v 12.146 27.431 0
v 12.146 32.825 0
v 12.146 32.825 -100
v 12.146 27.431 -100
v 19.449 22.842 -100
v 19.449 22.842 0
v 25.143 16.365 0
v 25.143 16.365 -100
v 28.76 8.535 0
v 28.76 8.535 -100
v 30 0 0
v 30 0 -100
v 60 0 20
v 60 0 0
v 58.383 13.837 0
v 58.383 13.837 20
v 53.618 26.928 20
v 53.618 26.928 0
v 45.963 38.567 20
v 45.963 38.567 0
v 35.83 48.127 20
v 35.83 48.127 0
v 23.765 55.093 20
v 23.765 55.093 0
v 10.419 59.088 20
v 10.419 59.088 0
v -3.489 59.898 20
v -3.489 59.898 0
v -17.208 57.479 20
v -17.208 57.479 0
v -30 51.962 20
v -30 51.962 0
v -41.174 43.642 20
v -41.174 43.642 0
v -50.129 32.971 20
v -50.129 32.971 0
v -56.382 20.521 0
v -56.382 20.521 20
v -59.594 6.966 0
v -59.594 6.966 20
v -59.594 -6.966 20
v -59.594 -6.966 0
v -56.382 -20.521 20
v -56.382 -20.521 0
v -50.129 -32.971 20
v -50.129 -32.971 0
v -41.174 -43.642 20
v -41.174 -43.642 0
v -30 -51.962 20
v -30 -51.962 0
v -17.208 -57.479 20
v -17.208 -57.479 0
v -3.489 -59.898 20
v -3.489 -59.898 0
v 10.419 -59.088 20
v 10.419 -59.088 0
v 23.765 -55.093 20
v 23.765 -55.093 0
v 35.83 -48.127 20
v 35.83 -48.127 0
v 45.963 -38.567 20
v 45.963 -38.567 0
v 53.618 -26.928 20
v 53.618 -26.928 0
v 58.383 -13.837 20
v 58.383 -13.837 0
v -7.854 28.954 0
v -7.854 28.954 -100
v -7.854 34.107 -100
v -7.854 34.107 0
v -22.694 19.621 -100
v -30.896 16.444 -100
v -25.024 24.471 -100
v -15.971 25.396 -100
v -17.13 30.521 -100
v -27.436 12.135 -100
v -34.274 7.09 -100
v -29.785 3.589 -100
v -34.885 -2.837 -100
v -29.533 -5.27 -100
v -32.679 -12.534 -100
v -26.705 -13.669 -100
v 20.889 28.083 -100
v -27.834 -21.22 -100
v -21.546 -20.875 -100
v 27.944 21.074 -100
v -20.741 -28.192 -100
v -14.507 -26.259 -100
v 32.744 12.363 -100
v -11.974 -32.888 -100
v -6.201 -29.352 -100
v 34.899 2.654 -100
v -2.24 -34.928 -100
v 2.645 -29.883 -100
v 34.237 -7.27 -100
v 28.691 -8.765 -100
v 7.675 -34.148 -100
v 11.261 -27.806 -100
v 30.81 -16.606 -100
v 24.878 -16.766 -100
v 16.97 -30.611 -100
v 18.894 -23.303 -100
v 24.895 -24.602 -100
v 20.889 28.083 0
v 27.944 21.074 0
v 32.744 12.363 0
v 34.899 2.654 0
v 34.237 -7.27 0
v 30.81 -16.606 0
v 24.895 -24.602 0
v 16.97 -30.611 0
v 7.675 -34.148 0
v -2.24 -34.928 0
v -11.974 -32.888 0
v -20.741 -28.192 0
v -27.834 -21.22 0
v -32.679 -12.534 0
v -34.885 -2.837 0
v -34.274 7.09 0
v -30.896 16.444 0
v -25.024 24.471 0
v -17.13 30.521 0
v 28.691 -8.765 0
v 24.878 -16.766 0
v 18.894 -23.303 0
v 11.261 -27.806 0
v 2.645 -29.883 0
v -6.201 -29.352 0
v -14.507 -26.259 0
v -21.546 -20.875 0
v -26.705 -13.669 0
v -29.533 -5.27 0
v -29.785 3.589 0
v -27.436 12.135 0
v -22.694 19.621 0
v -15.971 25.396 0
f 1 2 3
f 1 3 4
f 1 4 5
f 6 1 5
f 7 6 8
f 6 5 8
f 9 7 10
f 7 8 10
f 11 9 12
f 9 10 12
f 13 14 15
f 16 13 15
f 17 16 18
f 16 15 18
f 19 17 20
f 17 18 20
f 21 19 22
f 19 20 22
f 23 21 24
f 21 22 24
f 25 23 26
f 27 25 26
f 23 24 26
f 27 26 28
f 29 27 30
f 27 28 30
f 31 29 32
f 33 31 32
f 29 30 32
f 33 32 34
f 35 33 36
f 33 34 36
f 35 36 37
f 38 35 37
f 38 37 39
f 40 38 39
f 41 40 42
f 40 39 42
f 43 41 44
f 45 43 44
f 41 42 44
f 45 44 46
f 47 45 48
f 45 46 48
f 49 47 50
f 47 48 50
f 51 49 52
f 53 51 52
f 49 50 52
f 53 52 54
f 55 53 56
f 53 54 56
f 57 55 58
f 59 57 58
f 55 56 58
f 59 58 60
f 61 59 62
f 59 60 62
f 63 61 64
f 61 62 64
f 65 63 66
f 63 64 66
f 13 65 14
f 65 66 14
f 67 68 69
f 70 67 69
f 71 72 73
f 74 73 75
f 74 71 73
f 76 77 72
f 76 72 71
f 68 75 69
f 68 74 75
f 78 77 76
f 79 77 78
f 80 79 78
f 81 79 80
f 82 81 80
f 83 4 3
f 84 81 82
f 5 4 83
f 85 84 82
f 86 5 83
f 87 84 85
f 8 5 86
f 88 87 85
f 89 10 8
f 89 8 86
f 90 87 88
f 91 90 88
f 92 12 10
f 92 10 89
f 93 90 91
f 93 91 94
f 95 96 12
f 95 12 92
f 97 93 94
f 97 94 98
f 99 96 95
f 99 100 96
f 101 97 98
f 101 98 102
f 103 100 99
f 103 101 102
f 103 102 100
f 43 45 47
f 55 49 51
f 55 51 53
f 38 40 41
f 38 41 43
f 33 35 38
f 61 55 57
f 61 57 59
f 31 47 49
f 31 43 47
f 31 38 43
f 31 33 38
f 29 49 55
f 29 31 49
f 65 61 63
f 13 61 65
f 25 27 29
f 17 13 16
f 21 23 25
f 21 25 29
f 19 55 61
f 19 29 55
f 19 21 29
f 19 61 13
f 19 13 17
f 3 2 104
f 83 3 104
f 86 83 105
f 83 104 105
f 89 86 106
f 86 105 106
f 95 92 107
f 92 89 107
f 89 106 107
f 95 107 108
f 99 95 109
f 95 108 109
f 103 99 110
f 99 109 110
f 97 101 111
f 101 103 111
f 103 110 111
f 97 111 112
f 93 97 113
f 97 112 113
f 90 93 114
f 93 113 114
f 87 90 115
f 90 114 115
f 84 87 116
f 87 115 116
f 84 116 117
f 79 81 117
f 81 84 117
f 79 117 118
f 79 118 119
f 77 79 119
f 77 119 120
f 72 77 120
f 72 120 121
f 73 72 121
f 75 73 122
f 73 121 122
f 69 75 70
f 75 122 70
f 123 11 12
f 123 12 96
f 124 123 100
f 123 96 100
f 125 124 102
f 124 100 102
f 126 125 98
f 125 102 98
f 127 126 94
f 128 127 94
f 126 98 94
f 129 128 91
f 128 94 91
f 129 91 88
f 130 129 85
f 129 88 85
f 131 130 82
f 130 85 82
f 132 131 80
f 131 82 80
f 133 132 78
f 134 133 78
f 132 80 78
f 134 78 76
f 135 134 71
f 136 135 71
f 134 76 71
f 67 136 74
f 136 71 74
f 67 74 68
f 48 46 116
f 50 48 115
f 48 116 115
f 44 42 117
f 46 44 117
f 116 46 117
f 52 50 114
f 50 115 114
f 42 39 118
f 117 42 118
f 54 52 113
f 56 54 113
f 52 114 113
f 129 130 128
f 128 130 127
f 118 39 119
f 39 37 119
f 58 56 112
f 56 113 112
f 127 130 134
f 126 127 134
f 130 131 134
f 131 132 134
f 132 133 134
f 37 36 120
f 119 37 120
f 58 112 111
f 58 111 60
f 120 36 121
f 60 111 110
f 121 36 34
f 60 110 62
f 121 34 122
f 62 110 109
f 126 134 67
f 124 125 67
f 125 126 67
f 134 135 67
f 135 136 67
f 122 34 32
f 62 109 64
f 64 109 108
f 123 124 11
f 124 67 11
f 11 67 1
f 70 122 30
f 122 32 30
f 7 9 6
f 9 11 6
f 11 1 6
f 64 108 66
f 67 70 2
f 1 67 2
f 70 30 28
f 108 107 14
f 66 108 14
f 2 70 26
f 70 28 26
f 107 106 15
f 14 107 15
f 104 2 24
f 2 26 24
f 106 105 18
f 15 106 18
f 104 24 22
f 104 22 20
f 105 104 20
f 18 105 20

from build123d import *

# Parameters (mm, degrees)
F0_R     = 60
F1_DEPTH = 20
F2_R     = 35
F3_DEPTH = 100
F5_DEPTH = 100


with BuildPart() as f1:
    # F0 (on Top) → F1 (new body)
    with BuildSketch(Plane.XY):
        Circle(F0_R)
    extrude(amount=F1_DEPTH)

    # F2 (on face) → F3 (join)
    with BuildSketch(Plane(origin=(0, 0, 0), x_dir=(1, 0, 0), z_dir=(0, 0, -1))):
        Circle(F2_R)
    extrude(amount=F3_DEPTH)

    # F4 (on face) → F5 (cut)
    with BuildSketch(Plane(origin=(0, 0, -100), x_dir=(1, 0, 0), z_dir=(0, 0, -1))):
        with BuildLine():
            Line((-7.8536700457, -25.464490056), (-7.8536700457, -28.953753933))
            ThreePointArc((-7.8536700457, -28.953753933), (2.2773518168, -29.913436257), (12.1463299543, -27.4311259091))
            Line((12.1463299543, -27.4311259091), (12.1463299543, -25.464490056))
            Line((12.1463299543, -25.464490056), (-7.8536700457, -25.464490056))
        make_face()
        with BuildLine():
            ThreePointArc((12.1463299543, -27.4311259091), (25.1434872147, -16.3647502482), (30, 0))
            ThreePointArc((30, 0), (-18.22621599, 23.8286602789), (-7.8536700457, -28.953753933))
            Line((-7.8536700457, -28.953753933), (-7.8536700457, -25.464490056))
            Line((-7.8536700457, -25.464490056), (12.1463299543, -25.464490056))
            Line((12.1463299543, -25.464490056), (12.1463299543, -27.4311259091))
        make_face()
        with BuildLine():
            ThreePointArc((12.1463299543, -27.4311259091), (2.2773518168, -29.913436257), (-7.8536700457, -28.953753933))
            Line((-7.8536700457, -28.953753933), (-7.8536700457, -34.1074752336))
            ThreePointArc((-7.8536700457, -34.1074752336), (2.2401014005, -34.9282399459), (12.1463299543, -32.824787412))
            Line((12.1463299543, -32.824787412), (12.1463299543, -27.4311259091))
        make_face()
    extrude(amount=-F5_DEPTH, mode=Mode.SUBTRACT)


solid = f1.part
